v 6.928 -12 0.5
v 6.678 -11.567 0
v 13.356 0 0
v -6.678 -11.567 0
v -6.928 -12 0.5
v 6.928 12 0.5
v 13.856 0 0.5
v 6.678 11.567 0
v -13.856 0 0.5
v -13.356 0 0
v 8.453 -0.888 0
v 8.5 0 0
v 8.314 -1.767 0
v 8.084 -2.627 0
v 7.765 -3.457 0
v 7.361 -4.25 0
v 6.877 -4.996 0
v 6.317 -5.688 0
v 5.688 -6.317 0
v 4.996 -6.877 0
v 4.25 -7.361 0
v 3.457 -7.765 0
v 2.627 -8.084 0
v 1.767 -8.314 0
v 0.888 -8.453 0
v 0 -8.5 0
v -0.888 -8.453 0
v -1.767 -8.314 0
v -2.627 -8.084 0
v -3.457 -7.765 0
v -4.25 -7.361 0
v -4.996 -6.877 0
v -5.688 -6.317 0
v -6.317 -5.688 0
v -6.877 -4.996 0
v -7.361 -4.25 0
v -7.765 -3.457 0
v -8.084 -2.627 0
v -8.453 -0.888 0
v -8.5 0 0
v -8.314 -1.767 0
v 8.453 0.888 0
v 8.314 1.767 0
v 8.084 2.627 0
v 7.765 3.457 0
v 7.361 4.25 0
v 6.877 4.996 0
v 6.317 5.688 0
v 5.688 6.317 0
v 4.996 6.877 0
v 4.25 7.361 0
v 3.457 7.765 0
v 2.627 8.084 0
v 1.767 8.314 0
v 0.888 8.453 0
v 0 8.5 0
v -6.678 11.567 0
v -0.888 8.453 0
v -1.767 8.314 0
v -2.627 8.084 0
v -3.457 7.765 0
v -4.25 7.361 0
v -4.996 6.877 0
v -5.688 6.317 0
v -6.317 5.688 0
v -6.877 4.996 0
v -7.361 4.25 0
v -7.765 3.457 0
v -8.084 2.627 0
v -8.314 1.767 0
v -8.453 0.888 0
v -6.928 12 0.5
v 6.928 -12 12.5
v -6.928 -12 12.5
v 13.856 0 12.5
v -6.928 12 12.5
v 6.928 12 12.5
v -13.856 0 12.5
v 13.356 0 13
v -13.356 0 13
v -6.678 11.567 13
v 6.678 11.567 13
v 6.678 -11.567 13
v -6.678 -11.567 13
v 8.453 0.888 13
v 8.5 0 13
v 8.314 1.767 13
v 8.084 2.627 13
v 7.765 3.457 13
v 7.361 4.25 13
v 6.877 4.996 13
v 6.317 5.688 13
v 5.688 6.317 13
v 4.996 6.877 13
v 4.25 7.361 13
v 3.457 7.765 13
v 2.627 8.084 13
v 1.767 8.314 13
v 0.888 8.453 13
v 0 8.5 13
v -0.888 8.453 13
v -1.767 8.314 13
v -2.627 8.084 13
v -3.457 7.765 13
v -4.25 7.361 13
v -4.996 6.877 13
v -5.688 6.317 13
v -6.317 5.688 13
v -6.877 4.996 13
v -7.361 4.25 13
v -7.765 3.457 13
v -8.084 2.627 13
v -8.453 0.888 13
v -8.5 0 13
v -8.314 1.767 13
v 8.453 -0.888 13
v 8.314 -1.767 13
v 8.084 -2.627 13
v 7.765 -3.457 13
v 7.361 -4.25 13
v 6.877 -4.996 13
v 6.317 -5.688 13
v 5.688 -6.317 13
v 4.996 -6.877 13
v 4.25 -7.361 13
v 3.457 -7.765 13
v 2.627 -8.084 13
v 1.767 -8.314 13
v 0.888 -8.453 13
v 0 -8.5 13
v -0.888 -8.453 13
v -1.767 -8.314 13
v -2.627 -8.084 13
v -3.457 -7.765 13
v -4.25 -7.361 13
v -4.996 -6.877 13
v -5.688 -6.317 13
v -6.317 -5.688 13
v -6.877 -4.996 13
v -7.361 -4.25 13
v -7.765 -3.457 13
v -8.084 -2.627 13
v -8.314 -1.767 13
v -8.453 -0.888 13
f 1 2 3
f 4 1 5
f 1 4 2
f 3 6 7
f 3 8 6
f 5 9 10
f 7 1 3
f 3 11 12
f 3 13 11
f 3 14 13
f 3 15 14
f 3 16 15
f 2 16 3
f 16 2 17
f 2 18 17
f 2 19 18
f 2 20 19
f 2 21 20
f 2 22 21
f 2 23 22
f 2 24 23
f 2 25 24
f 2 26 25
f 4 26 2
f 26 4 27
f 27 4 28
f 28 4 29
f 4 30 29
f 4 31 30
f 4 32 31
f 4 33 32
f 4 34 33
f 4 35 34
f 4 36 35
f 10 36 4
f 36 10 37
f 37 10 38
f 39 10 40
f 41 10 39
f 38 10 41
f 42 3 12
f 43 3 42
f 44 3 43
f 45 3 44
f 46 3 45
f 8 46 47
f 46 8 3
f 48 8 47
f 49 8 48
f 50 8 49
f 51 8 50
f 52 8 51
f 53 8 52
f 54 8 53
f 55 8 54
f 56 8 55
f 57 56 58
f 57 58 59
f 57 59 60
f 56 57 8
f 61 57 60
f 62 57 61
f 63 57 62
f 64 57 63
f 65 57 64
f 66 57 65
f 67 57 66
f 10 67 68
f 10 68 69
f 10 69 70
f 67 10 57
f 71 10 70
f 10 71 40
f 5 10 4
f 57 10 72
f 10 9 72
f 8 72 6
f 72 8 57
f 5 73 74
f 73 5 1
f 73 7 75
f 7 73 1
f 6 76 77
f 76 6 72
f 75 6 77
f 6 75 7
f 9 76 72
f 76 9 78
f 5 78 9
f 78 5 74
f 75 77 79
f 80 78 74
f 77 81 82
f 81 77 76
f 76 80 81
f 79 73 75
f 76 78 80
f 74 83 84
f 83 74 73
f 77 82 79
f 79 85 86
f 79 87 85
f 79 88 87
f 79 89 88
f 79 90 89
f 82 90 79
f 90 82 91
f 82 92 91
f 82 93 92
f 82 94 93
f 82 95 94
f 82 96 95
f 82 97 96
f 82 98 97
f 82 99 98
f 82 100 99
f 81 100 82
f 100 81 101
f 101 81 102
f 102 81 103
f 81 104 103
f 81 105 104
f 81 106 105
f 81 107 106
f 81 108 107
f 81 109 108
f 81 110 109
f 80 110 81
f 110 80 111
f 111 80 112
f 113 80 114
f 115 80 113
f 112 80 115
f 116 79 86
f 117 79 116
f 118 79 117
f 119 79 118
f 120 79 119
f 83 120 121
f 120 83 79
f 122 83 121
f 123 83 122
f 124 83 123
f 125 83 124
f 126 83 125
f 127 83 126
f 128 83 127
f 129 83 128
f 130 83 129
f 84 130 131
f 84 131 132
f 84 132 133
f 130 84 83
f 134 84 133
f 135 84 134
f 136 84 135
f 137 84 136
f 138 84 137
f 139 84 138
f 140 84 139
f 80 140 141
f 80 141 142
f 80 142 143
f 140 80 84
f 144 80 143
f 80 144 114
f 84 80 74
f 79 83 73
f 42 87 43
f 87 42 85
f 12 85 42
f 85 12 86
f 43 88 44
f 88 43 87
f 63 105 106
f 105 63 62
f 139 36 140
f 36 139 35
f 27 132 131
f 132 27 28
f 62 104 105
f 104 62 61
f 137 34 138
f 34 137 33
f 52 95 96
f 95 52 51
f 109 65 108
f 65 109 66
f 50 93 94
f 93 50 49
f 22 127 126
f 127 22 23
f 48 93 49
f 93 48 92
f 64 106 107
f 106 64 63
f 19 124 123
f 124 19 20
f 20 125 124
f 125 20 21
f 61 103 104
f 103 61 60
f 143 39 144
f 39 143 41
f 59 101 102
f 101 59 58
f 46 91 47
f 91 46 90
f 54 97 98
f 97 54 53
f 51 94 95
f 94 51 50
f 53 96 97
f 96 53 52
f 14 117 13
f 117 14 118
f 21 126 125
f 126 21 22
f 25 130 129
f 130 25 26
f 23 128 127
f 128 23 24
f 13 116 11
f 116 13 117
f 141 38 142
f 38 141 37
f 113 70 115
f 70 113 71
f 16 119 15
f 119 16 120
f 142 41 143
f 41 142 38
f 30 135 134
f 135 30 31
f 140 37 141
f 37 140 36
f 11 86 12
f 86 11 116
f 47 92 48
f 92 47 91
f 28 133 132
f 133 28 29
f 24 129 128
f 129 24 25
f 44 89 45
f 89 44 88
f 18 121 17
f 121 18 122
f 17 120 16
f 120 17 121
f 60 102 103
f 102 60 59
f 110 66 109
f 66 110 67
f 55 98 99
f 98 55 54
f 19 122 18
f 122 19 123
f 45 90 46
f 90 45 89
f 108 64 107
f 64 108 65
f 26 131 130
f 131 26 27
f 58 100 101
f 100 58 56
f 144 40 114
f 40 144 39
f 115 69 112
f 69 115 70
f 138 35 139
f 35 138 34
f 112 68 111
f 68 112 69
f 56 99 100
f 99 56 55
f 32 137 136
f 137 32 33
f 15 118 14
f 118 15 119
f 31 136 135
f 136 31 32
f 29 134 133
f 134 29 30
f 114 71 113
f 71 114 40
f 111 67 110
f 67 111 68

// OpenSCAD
// Through hex nut.
$fn = 60;
eps = 0.02;
thread_clearance_d = 17;
flat = 24;
thickness = 13;
chamfer = 0.5;
difference() {
    union() {
        cylinder(d1 = flat / cos(30) - 2 * chamfer, d2 = flat / cos(30), h = chamfer, $fn = 6);
        translate([0, 0, chamfer]) cylinder(d = flat / cos(30), h = thickness - 2 * chamfer, $fn = 6);
        translate([0, 0, thickness - chamfer]) cylinder(d1 = flat / cos(30), d2 = flat / cos(30) - 2 * chamfer, h = chamfer, $fn = 6);
    }
    translate([0, 0, -eps]) cylinder(d = thread_clearance_d, h = thickness + 2 * eps);
}
